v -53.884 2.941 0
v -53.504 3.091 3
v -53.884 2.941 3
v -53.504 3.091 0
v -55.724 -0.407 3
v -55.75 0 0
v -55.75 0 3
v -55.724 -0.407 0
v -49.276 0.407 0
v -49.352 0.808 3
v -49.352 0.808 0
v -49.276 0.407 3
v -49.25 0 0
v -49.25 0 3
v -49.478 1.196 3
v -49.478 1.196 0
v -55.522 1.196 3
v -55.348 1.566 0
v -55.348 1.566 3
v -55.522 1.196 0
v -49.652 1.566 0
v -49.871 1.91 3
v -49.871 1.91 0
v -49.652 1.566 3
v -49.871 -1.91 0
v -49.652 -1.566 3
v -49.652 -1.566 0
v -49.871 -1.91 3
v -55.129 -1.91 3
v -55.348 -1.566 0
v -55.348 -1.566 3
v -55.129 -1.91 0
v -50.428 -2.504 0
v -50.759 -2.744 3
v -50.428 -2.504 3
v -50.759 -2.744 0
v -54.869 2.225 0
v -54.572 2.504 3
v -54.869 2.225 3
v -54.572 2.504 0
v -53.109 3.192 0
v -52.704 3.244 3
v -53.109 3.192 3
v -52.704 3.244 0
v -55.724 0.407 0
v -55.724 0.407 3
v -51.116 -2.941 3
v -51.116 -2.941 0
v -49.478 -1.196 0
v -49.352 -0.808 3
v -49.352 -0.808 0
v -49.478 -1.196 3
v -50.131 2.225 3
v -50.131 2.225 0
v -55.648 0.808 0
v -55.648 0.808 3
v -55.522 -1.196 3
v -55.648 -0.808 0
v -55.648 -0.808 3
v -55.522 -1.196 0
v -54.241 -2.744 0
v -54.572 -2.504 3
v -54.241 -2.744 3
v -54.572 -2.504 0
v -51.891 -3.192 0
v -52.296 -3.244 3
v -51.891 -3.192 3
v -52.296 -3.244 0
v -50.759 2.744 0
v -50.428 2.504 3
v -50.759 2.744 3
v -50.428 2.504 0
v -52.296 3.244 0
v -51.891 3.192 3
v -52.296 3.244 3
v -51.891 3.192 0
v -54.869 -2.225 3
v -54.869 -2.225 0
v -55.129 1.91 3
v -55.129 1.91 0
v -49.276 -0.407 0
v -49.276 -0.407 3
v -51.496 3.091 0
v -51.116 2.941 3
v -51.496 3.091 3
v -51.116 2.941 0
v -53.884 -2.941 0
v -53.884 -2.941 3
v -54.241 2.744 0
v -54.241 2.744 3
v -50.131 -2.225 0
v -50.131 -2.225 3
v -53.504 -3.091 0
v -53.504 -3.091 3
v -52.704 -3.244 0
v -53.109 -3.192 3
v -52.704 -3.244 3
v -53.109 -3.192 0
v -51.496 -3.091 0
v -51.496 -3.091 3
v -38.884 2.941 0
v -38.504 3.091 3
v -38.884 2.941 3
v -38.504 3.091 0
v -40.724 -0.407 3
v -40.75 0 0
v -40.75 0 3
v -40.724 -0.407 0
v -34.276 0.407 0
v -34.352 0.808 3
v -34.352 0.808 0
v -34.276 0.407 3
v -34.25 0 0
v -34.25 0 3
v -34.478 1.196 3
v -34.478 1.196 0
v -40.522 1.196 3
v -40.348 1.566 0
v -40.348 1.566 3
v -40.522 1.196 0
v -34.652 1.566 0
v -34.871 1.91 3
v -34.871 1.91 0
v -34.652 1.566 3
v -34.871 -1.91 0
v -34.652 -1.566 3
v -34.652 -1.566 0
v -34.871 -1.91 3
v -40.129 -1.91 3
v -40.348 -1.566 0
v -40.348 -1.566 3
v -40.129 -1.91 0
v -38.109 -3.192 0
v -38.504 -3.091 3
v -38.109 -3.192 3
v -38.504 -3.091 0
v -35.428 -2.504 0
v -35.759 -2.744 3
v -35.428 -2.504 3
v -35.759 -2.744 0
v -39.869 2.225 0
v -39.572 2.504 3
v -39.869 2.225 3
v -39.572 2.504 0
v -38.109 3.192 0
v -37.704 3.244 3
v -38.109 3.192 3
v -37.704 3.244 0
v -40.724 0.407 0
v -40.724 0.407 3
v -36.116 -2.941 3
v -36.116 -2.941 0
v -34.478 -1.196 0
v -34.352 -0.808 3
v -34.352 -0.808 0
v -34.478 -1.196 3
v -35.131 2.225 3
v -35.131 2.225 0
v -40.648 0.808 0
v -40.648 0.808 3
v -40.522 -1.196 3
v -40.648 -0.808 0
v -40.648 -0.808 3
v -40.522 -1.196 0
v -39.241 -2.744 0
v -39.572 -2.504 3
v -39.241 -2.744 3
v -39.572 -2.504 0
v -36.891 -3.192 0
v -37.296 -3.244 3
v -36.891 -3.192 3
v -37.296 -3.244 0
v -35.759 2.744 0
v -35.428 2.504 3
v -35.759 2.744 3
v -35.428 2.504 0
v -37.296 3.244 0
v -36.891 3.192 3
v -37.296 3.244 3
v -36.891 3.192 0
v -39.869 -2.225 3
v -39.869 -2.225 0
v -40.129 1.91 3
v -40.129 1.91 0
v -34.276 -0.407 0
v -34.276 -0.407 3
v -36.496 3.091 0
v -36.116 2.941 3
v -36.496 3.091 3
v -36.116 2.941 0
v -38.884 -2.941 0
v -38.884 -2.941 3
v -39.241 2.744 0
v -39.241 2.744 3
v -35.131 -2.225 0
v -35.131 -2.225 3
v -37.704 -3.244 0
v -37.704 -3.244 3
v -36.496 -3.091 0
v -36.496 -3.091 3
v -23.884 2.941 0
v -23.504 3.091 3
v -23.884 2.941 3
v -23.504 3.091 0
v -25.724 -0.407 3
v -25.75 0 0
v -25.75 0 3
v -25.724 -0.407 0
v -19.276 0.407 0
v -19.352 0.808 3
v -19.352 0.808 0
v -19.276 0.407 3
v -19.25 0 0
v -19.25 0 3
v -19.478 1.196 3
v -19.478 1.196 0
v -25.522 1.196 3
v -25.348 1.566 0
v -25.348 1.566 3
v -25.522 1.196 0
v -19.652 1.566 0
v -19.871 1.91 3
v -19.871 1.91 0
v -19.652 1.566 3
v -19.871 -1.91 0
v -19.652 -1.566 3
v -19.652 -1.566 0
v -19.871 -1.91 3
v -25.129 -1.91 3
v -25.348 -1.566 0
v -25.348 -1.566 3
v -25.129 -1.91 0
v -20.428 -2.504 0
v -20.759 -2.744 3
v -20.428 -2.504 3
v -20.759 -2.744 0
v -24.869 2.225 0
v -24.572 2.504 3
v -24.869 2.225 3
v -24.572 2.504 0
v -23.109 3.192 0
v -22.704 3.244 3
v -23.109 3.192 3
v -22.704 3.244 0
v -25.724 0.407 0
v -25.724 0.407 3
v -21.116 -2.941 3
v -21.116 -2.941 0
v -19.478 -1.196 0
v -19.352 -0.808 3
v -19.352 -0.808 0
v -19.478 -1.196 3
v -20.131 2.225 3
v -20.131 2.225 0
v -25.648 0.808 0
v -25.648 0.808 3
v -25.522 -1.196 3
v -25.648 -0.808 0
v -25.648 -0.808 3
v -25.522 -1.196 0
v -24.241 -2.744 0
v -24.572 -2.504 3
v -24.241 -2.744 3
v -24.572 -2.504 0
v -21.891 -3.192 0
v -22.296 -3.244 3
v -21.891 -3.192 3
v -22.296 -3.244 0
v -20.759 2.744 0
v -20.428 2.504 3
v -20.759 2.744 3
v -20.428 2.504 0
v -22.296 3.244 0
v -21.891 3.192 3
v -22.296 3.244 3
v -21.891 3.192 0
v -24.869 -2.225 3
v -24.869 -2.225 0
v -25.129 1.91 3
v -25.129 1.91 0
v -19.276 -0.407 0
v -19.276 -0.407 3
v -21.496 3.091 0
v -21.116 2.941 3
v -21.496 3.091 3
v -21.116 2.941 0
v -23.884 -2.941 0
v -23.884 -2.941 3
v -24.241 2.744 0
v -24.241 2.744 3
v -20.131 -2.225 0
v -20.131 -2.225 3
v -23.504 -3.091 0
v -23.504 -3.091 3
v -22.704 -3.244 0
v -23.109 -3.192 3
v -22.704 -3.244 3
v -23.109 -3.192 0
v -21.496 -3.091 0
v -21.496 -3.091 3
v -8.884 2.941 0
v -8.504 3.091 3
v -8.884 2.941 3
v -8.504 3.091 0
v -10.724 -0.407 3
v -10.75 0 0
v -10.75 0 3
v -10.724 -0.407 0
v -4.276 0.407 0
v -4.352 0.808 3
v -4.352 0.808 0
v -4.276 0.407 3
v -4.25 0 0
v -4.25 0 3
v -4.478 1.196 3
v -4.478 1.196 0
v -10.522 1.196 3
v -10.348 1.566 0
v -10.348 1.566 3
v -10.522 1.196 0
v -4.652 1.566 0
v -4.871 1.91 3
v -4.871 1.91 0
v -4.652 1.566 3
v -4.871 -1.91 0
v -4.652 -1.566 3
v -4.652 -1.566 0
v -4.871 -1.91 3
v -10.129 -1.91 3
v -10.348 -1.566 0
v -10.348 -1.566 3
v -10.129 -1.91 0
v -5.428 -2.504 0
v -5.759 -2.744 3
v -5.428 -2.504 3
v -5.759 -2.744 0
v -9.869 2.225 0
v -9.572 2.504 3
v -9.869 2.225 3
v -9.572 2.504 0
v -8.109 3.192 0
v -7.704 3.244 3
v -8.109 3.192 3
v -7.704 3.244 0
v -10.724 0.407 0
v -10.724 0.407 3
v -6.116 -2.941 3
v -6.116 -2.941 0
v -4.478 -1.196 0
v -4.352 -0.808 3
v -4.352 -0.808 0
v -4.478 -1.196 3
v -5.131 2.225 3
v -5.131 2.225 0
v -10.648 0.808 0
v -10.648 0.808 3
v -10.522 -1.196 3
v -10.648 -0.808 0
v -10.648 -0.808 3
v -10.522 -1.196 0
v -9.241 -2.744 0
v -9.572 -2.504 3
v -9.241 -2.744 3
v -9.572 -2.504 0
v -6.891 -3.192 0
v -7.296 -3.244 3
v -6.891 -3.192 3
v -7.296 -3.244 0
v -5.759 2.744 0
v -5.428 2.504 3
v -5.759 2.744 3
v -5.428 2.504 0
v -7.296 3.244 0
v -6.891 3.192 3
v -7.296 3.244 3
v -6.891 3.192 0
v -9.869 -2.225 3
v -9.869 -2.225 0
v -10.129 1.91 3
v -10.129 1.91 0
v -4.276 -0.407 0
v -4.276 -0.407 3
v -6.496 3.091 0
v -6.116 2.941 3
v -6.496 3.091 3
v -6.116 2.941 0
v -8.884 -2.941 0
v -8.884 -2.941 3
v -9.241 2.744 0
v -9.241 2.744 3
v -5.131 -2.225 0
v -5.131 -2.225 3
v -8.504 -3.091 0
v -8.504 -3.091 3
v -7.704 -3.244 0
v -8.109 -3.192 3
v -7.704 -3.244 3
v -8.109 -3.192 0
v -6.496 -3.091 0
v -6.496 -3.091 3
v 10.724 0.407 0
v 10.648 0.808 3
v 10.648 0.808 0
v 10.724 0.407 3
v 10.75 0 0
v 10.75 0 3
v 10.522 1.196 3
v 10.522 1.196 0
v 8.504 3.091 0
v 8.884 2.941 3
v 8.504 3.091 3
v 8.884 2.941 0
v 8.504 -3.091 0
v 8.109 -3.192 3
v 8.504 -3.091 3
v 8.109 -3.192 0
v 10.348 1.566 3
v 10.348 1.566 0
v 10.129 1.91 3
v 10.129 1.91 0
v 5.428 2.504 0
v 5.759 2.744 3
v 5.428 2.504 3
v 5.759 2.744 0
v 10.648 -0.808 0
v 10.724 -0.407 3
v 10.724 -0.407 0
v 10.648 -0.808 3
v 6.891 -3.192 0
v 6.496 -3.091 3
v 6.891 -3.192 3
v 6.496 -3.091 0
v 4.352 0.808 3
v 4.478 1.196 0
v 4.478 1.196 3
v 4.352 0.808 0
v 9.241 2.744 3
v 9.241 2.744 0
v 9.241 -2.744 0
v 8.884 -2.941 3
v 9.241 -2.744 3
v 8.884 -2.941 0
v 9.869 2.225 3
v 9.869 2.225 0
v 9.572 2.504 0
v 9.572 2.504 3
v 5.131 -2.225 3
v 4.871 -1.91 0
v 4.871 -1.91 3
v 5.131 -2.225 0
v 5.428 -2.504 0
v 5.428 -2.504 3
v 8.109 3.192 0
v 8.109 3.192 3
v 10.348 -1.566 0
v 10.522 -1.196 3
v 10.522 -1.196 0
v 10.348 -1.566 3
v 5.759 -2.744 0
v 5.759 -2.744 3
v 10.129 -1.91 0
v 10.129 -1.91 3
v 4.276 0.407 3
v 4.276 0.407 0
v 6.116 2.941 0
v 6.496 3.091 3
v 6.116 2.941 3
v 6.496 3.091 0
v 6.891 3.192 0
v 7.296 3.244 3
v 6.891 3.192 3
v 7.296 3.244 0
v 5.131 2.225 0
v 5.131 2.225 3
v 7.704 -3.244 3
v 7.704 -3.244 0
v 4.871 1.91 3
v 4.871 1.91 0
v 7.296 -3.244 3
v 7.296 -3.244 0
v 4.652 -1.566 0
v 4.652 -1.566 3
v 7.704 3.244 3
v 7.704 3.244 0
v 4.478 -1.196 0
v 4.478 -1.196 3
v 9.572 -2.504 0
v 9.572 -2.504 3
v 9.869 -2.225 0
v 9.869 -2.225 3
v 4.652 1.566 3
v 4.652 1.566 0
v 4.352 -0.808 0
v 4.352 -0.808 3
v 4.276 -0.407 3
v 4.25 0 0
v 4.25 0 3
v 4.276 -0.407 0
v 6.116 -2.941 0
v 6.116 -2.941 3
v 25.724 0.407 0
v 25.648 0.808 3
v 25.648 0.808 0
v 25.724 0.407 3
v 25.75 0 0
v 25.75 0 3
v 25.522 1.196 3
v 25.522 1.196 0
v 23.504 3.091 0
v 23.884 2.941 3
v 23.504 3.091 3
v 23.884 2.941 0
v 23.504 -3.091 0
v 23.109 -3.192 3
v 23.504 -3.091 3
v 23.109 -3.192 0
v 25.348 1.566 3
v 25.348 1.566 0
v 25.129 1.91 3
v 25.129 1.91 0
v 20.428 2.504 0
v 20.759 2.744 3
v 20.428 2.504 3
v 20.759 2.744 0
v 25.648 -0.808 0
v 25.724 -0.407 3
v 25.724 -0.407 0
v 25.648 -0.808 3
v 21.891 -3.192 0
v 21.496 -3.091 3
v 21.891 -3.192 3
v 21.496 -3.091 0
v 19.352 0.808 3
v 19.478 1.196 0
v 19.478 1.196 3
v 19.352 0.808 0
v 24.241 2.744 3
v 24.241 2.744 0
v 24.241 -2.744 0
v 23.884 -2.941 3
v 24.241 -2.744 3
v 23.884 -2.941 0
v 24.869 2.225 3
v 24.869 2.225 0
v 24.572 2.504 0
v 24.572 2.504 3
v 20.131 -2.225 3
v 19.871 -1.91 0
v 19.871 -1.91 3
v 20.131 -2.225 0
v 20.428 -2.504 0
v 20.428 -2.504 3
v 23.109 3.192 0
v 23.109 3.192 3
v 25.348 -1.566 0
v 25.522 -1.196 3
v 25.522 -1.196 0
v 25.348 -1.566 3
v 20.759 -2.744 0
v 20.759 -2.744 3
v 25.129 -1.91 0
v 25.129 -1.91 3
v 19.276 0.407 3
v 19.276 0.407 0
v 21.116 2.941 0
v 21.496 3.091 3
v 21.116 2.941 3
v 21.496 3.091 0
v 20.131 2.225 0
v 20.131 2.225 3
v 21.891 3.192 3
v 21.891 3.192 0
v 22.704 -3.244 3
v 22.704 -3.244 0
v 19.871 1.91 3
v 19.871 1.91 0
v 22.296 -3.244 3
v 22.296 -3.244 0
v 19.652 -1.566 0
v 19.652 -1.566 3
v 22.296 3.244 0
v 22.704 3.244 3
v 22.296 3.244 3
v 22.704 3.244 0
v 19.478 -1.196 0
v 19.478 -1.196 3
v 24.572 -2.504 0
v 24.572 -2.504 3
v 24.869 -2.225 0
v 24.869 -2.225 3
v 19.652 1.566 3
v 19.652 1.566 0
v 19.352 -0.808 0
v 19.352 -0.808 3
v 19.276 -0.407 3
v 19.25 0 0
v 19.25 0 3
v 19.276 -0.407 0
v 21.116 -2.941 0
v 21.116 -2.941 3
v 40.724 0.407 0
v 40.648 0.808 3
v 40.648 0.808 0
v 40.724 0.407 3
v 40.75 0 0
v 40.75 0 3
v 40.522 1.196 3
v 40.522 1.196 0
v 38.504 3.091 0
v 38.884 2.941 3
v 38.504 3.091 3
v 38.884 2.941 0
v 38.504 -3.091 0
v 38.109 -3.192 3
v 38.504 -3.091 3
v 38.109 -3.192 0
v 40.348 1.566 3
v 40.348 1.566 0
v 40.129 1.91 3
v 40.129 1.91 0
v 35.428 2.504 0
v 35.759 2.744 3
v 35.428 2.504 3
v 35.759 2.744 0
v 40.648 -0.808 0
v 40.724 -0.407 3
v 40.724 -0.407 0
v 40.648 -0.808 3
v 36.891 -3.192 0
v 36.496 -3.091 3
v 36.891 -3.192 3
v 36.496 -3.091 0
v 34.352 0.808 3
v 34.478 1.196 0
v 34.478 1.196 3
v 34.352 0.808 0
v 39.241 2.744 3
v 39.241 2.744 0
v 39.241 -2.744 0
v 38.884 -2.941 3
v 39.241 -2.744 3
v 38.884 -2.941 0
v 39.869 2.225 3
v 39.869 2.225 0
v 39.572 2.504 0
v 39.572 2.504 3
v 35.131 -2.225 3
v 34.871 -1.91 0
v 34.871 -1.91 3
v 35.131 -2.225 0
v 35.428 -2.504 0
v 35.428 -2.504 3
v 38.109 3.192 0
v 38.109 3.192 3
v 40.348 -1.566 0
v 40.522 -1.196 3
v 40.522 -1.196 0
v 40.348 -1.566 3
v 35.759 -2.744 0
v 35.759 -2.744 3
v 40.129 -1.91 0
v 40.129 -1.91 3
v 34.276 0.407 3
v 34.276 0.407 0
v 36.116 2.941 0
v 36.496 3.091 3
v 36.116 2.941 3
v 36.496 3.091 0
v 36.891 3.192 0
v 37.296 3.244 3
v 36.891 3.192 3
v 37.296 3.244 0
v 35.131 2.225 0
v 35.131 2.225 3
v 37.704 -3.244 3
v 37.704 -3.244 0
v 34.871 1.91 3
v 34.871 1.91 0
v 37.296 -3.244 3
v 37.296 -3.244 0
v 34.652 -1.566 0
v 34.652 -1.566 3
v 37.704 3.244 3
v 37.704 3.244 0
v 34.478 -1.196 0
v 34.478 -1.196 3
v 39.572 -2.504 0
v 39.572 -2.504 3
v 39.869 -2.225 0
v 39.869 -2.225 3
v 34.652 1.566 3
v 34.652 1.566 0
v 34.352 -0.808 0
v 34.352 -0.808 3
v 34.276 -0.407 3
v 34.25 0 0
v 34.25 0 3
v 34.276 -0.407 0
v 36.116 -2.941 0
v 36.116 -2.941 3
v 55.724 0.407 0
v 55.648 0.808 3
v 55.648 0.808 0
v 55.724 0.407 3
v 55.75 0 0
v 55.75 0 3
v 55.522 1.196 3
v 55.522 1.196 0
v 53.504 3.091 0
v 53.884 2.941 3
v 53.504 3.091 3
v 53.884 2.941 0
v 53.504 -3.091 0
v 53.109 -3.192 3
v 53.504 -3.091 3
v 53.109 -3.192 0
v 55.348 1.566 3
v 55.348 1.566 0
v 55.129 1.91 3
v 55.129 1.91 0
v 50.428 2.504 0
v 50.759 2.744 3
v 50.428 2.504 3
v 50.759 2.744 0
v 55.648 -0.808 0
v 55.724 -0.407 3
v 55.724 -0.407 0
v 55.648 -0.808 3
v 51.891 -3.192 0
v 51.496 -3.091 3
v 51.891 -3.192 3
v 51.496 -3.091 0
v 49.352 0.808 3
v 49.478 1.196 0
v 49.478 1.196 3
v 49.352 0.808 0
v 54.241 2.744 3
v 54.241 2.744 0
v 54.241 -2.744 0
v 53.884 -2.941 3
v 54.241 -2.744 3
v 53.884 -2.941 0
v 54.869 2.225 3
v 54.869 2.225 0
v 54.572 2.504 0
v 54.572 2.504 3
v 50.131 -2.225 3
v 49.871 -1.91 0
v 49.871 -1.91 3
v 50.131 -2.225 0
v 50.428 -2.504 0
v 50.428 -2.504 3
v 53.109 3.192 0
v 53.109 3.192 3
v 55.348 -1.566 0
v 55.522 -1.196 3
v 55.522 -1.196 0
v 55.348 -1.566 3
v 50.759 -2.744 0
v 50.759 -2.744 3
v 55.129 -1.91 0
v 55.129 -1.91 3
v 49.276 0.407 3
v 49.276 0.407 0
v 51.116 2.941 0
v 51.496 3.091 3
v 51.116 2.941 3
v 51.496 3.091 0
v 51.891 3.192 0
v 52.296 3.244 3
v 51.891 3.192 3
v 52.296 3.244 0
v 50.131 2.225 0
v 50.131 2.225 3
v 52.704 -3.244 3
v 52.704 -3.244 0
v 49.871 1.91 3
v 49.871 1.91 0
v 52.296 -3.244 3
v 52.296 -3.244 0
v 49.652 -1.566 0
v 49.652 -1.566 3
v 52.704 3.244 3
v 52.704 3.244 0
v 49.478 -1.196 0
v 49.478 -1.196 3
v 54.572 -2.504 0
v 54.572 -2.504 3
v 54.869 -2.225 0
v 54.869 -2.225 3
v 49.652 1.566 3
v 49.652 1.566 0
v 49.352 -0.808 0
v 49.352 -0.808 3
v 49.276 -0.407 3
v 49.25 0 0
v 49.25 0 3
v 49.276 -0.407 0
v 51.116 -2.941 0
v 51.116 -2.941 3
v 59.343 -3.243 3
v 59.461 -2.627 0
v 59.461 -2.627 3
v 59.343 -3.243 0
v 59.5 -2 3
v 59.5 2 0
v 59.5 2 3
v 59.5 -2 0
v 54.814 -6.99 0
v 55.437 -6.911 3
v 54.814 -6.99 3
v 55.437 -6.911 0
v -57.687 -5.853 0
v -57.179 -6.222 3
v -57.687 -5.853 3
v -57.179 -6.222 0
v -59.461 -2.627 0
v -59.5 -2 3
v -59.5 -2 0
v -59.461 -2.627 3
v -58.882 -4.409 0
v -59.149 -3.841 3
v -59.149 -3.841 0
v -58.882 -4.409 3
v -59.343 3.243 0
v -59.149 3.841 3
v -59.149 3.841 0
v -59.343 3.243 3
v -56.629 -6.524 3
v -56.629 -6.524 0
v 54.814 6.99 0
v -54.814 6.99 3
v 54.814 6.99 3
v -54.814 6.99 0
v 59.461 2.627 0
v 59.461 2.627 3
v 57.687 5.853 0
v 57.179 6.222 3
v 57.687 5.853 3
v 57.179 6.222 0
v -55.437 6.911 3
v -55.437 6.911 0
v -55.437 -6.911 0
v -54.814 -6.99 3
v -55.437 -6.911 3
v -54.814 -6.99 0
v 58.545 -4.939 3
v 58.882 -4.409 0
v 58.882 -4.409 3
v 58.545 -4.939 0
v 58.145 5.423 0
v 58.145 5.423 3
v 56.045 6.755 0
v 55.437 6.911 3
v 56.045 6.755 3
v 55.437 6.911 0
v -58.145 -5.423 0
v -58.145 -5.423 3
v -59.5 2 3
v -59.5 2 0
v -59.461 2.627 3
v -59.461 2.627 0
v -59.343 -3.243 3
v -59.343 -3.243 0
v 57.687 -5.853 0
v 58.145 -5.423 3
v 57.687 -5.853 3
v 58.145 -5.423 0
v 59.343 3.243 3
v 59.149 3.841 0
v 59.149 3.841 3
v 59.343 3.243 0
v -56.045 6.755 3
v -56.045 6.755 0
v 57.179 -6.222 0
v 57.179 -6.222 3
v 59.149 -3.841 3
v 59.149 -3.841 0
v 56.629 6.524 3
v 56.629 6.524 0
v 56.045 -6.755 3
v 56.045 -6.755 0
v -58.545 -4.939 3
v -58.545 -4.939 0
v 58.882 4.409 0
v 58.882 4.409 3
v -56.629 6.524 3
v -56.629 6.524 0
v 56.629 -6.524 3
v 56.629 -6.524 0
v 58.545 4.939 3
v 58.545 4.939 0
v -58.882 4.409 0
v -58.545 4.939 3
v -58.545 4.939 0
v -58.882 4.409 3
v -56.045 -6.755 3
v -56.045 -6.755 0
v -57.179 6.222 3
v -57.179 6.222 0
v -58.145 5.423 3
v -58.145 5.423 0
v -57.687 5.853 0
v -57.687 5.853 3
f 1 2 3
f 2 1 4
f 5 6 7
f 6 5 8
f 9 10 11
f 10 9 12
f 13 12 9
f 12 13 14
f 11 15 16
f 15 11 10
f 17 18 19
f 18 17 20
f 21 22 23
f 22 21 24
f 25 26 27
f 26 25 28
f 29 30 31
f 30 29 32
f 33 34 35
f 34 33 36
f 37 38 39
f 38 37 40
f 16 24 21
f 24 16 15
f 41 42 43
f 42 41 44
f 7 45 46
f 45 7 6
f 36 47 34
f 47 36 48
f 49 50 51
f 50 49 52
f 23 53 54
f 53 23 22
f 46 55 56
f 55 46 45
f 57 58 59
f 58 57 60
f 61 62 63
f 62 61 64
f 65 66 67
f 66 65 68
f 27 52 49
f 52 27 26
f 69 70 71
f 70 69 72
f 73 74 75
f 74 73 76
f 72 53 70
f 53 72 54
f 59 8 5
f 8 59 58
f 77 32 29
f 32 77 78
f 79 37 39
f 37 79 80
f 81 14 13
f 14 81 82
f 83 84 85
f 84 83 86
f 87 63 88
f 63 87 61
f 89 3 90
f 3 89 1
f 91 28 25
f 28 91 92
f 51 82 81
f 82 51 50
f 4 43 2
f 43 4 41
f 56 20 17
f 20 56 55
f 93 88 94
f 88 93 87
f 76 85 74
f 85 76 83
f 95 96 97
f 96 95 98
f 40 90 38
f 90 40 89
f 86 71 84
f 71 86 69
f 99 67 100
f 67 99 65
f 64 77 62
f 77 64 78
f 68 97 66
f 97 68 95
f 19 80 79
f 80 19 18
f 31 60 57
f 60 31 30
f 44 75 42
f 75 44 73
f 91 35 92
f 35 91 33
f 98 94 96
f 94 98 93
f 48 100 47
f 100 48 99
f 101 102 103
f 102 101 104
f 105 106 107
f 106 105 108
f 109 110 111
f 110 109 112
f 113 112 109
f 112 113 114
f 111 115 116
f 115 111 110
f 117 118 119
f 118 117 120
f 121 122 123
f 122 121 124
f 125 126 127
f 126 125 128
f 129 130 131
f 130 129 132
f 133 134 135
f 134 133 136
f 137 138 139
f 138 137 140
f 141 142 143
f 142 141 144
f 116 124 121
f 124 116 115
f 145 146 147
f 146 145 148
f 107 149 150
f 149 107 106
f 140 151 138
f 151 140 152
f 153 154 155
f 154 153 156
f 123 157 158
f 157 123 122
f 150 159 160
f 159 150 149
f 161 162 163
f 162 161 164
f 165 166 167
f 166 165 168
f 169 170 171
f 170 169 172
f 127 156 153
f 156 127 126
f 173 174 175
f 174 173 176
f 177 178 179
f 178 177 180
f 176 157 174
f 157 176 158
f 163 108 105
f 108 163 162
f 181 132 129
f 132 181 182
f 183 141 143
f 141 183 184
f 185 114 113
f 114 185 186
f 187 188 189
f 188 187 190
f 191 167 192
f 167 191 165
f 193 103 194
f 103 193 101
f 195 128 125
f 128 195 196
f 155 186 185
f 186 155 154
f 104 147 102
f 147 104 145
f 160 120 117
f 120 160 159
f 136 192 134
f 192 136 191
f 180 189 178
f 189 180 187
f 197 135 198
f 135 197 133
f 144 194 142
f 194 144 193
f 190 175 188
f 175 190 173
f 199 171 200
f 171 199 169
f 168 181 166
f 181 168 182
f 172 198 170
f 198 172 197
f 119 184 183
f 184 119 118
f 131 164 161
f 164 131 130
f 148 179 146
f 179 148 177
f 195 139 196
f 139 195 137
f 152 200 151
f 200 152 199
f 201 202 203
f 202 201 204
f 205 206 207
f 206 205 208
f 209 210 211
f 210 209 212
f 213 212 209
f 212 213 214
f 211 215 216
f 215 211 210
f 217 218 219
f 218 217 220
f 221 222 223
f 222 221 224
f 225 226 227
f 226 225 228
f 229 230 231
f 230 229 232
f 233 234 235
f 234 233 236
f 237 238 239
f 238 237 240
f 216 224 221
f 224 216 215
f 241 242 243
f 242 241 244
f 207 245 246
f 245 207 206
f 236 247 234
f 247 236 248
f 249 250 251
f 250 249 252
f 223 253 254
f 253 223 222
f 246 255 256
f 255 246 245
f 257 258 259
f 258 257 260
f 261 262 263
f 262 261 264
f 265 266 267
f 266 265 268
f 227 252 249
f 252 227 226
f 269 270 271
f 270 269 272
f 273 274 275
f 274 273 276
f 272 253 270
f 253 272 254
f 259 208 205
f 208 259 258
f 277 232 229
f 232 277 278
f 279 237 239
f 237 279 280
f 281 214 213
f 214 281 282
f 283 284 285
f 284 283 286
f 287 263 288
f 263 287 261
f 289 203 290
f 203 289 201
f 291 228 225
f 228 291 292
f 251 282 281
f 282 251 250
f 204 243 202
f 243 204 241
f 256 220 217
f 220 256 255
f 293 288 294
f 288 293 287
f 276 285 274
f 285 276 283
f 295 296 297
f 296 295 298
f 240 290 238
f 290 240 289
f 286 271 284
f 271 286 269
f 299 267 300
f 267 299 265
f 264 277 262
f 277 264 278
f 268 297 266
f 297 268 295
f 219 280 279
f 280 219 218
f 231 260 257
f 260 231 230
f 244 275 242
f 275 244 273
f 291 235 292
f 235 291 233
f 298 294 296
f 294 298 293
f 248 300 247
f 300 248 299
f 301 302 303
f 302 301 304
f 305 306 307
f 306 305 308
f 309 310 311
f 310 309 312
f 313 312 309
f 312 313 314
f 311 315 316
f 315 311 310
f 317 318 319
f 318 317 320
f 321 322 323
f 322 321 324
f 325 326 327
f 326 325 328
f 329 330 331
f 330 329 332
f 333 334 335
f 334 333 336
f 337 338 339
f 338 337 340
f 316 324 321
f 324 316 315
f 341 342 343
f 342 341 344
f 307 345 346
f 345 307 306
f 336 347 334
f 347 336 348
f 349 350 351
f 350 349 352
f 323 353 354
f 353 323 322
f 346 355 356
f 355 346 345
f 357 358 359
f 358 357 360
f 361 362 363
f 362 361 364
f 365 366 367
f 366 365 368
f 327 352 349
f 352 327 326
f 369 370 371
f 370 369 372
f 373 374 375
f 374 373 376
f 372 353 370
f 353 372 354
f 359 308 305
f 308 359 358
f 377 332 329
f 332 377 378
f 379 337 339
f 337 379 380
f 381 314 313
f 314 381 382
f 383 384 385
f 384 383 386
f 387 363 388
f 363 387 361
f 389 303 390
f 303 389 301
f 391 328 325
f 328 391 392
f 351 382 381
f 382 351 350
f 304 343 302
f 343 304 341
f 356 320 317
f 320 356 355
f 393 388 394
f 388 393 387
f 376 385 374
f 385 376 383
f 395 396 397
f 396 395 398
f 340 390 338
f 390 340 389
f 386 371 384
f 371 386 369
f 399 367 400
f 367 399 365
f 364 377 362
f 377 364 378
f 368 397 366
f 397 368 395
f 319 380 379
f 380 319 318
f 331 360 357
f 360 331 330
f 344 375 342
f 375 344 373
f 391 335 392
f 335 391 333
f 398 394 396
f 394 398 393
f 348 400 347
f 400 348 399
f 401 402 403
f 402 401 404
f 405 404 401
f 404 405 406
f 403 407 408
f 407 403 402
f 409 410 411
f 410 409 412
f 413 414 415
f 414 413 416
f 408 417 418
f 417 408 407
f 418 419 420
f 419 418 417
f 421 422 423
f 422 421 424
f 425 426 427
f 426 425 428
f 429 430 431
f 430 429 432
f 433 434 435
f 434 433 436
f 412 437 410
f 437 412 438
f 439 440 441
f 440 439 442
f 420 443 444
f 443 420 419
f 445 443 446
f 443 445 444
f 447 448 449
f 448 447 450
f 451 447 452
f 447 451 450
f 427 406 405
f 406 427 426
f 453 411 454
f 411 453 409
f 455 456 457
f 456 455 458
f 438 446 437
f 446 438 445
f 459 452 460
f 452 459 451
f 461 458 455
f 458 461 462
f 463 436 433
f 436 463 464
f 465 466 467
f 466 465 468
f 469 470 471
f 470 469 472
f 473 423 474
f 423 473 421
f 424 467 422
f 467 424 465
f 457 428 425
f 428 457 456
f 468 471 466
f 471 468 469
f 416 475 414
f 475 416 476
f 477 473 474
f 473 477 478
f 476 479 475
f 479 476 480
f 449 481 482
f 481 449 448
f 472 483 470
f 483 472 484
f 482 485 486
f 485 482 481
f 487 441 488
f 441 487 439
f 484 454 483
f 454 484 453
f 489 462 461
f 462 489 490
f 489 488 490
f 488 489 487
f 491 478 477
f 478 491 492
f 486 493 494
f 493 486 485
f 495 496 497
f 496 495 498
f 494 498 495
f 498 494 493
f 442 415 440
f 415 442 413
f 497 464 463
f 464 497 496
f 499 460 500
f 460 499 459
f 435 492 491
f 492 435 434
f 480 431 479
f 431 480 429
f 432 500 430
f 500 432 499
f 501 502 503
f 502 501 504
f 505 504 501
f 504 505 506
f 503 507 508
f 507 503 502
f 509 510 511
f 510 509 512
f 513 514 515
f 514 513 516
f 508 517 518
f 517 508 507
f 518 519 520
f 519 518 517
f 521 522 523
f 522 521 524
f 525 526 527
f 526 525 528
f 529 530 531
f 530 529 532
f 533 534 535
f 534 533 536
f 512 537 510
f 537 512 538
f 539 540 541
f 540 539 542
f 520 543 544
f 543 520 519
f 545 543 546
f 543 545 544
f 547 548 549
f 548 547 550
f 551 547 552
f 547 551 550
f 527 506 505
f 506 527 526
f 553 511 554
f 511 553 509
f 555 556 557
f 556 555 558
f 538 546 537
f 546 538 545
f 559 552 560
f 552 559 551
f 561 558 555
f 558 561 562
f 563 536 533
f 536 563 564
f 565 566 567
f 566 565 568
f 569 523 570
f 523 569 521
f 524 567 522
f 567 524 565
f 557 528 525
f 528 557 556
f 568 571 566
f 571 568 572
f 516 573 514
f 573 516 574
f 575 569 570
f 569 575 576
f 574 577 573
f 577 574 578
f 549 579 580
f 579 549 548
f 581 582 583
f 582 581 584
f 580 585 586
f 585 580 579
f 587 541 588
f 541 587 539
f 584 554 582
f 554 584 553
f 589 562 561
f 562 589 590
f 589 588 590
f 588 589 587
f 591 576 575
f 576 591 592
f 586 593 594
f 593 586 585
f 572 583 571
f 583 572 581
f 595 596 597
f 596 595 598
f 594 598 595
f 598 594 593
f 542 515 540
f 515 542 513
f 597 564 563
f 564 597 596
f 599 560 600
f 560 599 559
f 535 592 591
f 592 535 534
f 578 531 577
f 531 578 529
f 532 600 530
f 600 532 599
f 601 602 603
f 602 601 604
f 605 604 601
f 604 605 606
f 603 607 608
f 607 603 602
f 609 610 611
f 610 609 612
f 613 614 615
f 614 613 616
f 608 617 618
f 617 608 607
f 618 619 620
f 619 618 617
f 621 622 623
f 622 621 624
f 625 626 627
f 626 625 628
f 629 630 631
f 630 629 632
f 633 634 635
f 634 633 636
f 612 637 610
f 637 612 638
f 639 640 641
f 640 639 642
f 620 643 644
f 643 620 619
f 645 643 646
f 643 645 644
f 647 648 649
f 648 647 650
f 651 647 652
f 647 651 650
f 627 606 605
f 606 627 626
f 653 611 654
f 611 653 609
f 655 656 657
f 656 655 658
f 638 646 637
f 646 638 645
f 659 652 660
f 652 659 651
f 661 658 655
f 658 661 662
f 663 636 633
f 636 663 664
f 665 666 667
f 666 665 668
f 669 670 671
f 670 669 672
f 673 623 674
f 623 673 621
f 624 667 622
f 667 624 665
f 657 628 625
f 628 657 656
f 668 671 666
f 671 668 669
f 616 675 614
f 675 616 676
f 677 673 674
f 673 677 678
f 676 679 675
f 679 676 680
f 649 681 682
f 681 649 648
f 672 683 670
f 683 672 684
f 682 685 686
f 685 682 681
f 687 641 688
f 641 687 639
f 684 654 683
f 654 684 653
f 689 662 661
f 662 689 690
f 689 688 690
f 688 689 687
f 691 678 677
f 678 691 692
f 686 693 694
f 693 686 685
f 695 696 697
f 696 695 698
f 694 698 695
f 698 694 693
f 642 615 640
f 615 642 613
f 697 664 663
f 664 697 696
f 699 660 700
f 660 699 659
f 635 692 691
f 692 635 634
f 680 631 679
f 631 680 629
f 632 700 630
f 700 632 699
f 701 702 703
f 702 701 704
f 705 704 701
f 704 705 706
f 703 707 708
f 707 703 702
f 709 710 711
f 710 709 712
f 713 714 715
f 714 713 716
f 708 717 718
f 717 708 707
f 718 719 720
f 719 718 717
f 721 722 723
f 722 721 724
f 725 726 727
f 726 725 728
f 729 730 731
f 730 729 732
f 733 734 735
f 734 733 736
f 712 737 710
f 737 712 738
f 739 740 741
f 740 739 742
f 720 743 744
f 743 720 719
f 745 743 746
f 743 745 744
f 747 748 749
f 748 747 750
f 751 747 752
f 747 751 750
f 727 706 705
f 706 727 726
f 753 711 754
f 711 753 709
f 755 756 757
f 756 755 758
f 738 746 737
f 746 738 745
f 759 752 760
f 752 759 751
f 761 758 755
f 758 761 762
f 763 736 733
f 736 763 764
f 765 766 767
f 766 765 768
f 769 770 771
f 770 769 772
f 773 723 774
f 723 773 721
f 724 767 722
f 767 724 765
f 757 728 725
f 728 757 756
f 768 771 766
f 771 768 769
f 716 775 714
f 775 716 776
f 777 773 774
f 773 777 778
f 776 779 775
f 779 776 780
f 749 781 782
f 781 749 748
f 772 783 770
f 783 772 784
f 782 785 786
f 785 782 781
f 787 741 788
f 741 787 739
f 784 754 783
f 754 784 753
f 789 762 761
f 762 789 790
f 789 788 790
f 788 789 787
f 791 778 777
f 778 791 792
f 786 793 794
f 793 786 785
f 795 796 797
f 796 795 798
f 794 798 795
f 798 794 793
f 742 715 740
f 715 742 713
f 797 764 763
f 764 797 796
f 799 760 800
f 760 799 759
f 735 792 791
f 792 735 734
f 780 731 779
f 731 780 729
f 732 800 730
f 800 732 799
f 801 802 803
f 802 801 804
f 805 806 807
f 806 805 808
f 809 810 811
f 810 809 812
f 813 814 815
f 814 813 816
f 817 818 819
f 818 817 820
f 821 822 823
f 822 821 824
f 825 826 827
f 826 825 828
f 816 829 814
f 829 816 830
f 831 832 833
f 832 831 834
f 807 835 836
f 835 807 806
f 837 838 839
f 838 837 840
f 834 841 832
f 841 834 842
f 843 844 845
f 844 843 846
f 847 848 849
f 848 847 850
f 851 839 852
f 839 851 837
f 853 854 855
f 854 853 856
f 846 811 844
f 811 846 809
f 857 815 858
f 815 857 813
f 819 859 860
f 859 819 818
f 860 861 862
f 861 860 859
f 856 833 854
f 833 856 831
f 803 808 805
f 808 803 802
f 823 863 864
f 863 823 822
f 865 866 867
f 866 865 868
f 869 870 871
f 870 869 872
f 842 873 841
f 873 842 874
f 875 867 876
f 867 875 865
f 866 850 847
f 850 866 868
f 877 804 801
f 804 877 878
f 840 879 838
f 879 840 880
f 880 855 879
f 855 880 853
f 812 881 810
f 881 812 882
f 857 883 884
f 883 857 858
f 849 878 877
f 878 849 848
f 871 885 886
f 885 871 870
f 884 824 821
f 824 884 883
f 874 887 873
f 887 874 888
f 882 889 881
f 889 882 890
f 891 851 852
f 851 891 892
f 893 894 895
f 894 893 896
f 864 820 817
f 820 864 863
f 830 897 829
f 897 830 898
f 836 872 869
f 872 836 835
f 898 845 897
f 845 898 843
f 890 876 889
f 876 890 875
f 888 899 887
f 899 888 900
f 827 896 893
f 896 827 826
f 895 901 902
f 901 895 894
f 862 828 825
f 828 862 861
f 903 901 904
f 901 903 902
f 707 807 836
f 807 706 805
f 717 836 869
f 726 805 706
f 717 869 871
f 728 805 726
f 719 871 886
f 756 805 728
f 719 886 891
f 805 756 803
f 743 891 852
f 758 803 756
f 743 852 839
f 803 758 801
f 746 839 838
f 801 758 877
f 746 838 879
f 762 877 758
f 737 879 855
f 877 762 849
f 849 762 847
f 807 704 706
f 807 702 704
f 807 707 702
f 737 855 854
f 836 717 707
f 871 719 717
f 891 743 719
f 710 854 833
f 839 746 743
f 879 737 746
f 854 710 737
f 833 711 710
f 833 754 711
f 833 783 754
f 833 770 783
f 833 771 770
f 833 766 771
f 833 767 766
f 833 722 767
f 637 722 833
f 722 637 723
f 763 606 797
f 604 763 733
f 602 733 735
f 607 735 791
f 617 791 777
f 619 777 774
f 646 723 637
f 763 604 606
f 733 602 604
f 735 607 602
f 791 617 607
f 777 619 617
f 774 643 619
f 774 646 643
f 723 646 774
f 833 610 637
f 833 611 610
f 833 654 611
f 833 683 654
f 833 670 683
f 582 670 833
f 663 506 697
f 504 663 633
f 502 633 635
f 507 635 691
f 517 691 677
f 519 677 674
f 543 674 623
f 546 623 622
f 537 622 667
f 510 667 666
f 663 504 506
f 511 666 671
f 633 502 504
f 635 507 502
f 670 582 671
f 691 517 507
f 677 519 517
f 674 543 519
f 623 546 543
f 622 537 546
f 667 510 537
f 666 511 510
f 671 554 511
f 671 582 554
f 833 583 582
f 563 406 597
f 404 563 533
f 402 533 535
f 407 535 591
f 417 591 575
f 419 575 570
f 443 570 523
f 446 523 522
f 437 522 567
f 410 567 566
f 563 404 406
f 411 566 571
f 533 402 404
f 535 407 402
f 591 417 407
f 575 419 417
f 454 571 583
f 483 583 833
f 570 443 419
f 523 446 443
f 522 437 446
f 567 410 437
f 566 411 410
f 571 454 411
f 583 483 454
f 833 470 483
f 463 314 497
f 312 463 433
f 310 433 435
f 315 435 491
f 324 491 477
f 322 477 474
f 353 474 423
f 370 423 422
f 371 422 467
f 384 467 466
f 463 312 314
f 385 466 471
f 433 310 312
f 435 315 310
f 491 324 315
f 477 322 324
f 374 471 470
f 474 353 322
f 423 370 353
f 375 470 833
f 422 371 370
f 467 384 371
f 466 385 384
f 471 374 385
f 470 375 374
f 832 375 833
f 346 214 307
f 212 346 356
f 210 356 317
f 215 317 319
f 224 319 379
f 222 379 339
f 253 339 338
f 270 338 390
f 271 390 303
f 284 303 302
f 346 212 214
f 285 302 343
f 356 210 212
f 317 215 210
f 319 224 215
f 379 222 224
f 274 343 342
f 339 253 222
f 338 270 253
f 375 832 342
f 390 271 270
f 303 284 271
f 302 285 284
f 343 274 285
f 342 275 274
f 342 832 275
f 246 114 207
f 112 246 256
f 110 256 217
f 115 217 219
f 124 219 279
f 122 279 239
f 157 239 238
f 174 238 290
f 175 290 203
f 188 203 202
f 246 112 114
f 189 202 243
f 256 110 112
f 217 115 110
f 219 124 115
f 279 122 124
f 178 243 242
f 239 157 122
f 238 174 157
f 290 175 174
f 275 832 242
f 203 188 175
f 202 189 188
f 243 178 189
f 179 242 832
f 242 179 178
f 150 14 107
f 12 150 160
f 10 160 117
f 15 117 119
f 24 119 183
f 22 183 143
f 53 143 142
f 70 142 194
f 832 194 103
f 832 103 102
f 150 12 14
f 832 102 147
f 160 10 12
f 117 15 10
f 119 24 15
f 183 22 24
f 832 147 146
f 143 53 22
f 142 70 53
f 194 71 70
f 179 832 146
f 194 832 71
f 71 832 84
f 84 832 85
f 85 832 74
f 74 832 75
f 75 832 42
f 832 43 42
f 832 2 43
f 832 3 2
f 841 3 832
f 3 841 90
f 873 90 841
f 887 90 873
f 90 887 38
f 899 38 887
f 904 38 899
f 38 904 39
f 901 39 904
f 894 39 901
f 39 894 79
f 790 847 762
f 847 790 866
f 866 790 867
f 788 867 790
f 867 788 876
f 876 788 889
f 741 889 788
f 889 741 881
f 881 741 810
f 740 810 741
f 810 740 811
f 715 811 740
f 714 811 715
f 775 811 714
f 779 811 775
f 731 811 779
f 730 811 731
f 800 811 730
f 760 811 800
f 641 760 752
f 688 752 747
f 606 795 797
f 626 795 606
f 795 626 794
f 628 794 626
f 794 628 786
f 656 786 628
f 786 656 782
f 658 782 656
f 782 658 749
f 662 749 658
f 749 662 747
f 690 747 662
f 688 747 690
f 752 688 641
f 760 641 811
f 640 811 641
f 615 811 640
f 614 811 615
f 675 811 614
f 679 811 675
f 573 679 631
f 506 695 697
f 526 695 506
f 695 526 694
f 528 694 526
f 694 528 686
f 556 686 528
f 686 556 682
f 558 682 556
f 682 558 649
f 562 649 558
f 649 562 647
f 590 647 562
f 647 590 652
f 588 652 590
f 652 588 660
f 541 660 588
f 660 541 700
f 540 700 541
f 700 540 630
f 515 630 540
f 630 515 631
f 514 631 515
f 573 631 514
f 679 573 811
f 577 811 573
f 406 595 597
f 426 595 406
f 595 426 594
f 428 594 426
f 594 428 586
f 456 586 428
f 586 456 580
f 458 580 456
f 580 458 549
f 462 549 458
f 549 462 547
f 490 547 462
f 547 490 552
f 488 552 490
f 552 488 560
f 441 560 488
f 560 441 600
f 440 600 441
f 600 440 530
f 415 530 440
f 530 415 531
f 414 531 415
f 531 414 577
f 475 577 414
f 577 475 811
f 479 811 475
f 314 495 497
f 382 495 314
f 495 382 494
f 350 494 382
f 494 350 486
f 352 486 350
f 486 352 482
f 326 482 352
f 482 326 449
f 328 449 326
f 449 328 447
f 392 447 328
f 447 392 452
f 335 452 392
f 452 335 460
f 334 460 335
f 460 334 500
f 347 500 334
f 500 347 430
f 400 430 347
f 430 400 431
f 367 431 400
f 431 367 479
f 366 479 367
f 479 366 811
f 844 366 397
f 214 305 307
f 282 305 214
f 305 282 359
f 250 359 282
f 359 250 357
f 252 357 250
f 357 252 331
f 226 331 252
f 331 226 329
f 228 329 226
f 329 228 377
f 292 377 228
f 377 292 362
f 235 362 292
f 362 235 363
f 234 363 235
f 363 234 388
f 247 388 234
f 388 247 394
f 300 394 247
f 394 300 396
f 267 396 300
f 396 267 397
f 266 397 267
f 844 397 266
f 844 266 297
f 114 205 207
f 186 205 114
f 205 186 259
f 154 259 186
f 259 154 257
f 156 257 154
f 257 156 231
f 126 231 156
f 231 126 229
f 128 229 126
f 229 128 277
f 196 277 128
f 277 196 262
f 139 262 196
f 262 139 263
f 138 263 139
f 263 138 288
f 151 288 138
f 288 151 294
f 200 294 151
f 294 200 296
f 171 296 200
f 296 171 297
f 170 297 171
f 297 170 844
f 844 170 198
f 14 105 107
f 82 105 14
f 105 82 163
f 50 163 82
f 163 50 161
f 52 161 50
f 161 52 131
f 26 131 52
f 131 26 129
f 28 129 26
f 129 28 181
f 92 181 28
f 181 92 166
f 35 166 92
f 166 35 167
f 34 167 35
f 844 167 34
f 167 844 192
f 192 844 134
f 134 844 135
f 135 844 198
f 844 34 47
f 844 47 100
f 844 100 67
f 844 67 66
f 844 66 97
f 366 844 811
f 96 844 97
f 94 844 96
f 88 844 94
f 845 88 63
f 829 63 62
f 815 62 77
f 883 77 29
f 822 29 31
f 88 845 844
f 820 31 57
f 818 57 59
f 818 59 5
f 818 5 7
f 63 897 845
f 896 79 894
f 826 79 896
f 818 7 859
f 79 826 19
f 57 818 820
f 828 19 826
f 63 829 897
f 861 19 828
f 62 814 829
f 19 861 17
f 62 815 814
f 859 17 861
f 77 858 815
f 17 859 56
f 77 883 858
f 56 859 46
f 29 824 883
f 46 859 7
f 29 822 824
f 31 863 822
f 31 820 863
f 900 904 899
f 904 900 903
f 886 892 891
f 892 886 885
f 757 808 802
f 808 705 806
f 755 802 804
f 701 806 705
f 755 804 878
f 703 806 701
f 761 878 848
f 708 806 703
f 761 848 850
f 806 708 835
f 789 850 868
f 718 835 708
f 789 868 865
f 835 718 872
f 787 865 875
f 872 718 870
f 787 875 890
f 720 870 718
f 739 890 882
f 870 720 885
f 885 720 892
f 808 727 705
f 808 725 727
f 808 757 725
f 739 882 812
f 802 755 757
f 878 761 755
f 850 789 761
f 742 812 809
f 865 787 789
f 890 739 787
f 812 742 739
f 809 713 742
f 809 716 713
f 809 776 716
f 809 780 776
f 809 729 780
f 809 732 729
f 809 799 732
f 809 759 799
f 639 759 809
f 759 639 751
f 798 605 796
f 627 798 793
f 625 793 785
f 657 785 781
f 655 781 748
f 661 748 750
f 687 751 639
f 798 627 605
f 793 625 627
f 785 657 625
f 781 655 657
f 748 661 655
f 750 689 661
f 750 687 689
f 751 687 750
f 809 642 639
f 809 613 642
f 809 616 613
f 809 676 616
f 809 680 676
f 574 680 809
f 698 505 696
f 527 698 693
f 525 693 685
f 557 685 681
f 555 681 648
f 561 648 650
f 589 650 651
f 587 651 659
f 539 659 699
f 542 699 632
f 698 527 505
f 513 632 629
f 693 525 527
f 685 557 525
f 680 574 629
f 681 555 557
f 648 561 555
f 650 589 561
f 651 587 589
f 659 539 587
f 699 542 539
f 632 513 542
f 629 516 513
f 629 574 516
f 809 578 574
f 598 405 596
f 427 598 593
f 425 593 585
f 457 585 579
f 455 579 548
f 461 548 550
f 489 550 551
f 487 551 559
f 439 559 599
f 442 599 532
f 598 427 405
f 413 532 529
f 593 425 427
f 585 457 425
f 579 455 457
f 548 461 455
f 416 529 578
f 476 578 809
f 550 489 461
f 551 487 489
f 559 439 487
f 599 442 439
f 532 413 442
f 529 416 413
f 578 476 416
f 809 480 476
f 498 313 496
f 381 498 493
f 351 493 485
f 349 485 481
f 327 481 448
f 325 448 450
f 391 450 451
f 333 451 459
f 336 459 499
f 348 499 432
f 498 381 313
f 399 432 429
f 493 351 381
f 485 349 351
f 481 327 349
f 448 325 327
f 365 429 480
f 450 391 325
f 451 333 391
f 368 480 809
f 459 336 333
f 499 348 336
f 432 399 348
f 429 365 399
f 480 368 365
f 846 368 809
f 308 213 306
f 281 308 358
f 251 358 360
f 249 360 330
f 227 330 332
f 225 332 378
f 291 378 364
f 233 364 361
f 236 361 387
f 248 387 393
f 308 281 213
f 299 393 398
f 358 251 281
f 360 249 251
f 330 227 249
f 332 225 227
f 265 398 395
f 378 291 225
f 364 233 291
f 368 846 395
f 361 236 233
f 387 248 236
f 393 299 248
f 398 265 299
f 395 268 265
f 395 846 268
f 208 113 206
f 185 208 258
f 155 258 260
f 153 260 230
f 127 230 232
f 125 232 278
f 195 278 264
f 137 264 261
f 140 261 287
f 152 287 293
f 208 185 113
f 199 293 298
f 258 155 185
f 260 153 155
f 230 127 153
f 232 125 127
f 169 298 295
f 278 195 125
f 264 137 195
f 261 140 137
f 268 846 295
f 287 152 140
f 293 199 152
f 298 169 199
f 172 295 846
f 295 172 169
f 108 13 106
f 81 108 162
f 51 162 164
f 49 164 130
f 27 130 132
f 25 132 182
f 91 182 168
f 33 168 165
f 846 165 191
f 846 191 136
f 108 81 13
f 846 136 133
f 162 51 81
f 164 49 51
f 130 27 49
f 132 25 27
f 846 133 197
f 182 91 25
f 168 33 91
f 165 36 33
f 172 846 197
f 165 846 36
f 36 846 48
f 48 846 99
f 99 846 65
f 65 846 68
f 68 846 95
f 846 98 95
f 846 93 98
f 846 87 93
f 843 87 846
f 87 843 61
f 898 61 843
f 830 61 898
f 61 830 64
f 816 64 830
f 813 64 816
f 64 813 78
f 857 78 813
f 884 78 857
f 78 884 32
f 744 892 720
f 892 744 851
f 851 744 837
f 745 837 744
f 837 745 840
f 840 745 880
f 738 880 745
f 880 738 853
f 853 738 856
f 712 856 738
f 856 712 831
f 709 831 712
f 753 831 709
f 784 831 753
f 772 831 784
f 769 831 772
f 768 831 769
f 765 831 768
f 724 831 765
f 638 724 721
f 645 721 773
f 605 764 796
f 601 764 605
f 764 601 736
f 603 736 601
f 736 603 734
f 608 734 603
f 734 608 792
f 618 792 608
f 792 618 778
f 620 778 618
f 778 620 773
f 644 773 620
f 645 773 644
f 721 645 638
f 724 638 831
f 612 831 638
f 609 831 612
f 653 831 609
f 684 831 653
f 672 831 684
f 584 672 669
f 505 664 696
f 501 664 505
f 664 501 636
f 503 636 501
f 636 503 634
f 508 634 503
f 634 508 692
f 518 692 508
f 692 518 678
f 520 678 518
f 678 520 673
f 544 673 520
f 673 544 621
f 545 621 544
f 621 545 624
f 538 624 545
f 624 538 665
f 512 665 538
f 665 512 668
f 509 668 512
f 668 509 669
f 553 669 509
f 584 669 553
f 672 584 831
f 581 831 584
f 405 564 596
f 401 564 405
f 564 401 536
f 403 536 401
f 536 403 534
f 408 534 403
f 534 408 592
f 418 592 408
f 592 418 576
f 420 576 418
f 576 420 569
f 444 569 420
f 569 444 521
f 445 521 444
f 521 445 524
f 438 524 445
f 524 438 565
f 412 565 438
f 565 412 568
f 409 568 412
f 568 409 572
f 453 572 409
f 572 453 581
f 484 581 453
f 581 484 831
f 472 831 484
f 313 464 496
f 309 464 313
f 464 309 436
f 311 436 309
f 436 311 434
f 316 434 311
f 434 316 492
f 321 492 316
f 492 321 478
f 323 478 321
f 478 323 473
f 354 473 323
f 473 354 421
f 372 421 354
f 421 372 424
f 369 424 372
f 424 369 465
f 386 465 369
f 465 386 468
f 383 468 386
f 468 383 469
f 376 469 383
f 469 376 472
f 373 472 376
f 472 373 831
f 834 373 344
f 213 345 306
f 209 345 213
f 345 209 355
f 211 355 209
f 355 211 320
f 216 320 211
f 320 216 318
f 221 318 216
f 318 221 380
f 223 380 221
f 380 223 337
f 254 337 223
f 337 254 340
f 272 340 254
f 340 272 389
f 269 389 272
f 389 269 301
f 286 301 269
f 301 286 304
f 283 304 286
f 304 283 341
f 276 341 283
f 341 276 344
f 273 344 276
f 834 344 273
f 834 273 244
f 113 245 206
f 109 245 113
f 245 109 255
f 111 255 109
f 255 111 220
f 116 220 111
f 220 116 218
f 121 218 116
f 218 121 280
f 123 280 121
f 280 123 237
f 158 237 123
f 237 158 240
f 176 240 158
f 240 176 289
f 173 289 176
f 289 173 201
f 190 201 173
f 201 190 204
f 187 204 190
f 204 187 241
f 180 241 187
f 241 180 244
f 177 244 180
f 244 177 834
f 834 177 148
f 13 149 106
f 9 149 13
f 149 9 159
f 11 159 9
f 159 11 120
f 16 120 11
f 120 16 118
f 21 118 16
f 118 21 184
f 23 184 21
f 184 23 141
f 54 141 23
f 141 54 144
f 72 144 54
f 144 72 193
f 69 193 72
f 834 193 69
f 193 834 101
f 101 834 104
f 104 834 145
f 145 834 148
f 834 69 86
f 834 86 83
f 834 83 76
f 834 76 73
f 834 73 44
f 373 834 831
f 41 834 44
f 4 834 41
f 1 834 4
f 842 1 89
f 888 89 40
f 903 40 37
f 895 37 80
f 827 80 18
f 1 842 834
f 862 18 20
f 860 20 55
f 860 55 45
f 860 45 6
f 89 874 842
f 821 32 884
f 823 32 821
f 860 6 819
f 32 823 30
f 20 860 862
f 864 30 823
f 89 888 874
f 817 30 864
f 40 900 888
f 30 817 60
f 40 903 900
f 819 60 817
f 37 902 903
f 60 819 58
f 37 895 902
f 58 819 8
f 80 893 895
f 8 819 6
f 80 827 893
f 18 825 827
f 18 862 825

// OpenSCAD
$fn = 50;


difference() {
	union() {
		translate(v = [0, 0, 0]) {
			rotate(a = [0, 0, 0]) {
				hull() {
					translate(v = [-54.5000000000, 2.0000000000, 0]) {
						rotate(a = [0, 0, 0]) {
							translate(v = [0, 0, 0]) {
								rotate(a = [0, 0, 0]) {
									cylinder(h = 3, r = 5);
								}
							}
						}
					}
					translate(v = [54.5000000000, 2.0000000000, 0]) {
						rotate(a = [0, 0, 0]) {
							translate(v = [0, 0, 0]) {
								rotate(a = [0, 0, 0]) {
									cylinder(h = 3, r = 5);
								}
							}
						}
					}
					translate(v = [-54.5000000000, -2.0000000000, 0]) {
						rotate(a = [0, 0, 0]) {
							translate(v = [0, 0, 0]) {
								rotate(a = [0, 0, 0]) {
									cylinder(h = 3, r = 5);
								}
							}
						}
					}
					translate(v = [54.5000000000, -2.0000000000, 0]) {
						rotate(a = [0, 0, 0]) {
							translate(v = [0, 0, 0]) {
								rotate(a = [0, 0, 0]) {
									cylinder(h = 3, r = 5);
								}
							}
						}
					}
				}
			}
		}
	}
	union() {
		translate(v = [-52.5000000000, 0.0000000000, 0]) {
			rotate(a = [0, 0, 0]) {
				translate(v = [0, 0, -50]) {
					rotate(a = [0, 0, 0]) {
						cylinder(h = 100, r = 3.2500000000);
					}
				}
			}
		}
		translate(v = [-37.5000000000, 0.0000000000, 0]) {
			rotate(a = [0, 0, 0]) {
				translate(v = [0, 0, -50]) {
					rotate(a = [0, 0, 0]) {
						cylinder(h = 100, r = 3.2500000000);
					}
				}
			}
		}
		translate(v = [-22.5000000000, 0.0000000000, 0]) {
			rotate(a = [0, 0, 0]) {
				translate(v = [0, 0, -50]) {
					rotate(a = [0, 0, 0]) {
						cylinder(h = 100, r = 3.2500000000);
					}
				}
			}
		}
		translate(v = [-7.5000000000, 0.0000000000, 0]) {
			rotate(a = [0, 0, 0]) {
				translate(v = [0, 0, -50]) {
					rotate(a = [0, 0, 0]) {
						cylinder(h = 100, r = 3.2500000000);
					}
				}
			}
		}
		translate(v = [7.5000000000, 0.0000000000, 0]) {
			rotate(a = [0, 0, 0]) {
				translate(v = [0, 0, -50]) {
					rotate(a = [0, 0, 0]) {
						cylinder(h = 100, r = 3.2500000000);
					}
				}
			}
		}
		translate(v = [22.5000000000, 0.0000000000, 0]) {
			rotate(a = [0, 0, 0]) {
				translate(v = [0, 0, -50]) {
					rotate(a = [0, 0, 0]) {
						cylinder(h = 100, r = 3.2500000000);
					}
				}
			}
		}
		translate(v = [37.5000000000, 0.0000000000, 0]) {
			rotate(a = [0, 0, 0]) {
				translate(v = [0, 0, -50]) {
					rotate(a = [0, 0, 0]) {
						cylinder(h = 100, r = 3.2500000000);
					}
				}
			}
		}
		translate(v = [52.5000000000, 0.0000000000, 0]) {
			rotate(a = [0, 0, 0]) {
				translate(v = [0, 0, -50]) {
					rotate(a = [0, 0, 0]) {
						cylinder(h = 100, r = 3.2500000000);
					}
				}
			}
		}
	}
}
